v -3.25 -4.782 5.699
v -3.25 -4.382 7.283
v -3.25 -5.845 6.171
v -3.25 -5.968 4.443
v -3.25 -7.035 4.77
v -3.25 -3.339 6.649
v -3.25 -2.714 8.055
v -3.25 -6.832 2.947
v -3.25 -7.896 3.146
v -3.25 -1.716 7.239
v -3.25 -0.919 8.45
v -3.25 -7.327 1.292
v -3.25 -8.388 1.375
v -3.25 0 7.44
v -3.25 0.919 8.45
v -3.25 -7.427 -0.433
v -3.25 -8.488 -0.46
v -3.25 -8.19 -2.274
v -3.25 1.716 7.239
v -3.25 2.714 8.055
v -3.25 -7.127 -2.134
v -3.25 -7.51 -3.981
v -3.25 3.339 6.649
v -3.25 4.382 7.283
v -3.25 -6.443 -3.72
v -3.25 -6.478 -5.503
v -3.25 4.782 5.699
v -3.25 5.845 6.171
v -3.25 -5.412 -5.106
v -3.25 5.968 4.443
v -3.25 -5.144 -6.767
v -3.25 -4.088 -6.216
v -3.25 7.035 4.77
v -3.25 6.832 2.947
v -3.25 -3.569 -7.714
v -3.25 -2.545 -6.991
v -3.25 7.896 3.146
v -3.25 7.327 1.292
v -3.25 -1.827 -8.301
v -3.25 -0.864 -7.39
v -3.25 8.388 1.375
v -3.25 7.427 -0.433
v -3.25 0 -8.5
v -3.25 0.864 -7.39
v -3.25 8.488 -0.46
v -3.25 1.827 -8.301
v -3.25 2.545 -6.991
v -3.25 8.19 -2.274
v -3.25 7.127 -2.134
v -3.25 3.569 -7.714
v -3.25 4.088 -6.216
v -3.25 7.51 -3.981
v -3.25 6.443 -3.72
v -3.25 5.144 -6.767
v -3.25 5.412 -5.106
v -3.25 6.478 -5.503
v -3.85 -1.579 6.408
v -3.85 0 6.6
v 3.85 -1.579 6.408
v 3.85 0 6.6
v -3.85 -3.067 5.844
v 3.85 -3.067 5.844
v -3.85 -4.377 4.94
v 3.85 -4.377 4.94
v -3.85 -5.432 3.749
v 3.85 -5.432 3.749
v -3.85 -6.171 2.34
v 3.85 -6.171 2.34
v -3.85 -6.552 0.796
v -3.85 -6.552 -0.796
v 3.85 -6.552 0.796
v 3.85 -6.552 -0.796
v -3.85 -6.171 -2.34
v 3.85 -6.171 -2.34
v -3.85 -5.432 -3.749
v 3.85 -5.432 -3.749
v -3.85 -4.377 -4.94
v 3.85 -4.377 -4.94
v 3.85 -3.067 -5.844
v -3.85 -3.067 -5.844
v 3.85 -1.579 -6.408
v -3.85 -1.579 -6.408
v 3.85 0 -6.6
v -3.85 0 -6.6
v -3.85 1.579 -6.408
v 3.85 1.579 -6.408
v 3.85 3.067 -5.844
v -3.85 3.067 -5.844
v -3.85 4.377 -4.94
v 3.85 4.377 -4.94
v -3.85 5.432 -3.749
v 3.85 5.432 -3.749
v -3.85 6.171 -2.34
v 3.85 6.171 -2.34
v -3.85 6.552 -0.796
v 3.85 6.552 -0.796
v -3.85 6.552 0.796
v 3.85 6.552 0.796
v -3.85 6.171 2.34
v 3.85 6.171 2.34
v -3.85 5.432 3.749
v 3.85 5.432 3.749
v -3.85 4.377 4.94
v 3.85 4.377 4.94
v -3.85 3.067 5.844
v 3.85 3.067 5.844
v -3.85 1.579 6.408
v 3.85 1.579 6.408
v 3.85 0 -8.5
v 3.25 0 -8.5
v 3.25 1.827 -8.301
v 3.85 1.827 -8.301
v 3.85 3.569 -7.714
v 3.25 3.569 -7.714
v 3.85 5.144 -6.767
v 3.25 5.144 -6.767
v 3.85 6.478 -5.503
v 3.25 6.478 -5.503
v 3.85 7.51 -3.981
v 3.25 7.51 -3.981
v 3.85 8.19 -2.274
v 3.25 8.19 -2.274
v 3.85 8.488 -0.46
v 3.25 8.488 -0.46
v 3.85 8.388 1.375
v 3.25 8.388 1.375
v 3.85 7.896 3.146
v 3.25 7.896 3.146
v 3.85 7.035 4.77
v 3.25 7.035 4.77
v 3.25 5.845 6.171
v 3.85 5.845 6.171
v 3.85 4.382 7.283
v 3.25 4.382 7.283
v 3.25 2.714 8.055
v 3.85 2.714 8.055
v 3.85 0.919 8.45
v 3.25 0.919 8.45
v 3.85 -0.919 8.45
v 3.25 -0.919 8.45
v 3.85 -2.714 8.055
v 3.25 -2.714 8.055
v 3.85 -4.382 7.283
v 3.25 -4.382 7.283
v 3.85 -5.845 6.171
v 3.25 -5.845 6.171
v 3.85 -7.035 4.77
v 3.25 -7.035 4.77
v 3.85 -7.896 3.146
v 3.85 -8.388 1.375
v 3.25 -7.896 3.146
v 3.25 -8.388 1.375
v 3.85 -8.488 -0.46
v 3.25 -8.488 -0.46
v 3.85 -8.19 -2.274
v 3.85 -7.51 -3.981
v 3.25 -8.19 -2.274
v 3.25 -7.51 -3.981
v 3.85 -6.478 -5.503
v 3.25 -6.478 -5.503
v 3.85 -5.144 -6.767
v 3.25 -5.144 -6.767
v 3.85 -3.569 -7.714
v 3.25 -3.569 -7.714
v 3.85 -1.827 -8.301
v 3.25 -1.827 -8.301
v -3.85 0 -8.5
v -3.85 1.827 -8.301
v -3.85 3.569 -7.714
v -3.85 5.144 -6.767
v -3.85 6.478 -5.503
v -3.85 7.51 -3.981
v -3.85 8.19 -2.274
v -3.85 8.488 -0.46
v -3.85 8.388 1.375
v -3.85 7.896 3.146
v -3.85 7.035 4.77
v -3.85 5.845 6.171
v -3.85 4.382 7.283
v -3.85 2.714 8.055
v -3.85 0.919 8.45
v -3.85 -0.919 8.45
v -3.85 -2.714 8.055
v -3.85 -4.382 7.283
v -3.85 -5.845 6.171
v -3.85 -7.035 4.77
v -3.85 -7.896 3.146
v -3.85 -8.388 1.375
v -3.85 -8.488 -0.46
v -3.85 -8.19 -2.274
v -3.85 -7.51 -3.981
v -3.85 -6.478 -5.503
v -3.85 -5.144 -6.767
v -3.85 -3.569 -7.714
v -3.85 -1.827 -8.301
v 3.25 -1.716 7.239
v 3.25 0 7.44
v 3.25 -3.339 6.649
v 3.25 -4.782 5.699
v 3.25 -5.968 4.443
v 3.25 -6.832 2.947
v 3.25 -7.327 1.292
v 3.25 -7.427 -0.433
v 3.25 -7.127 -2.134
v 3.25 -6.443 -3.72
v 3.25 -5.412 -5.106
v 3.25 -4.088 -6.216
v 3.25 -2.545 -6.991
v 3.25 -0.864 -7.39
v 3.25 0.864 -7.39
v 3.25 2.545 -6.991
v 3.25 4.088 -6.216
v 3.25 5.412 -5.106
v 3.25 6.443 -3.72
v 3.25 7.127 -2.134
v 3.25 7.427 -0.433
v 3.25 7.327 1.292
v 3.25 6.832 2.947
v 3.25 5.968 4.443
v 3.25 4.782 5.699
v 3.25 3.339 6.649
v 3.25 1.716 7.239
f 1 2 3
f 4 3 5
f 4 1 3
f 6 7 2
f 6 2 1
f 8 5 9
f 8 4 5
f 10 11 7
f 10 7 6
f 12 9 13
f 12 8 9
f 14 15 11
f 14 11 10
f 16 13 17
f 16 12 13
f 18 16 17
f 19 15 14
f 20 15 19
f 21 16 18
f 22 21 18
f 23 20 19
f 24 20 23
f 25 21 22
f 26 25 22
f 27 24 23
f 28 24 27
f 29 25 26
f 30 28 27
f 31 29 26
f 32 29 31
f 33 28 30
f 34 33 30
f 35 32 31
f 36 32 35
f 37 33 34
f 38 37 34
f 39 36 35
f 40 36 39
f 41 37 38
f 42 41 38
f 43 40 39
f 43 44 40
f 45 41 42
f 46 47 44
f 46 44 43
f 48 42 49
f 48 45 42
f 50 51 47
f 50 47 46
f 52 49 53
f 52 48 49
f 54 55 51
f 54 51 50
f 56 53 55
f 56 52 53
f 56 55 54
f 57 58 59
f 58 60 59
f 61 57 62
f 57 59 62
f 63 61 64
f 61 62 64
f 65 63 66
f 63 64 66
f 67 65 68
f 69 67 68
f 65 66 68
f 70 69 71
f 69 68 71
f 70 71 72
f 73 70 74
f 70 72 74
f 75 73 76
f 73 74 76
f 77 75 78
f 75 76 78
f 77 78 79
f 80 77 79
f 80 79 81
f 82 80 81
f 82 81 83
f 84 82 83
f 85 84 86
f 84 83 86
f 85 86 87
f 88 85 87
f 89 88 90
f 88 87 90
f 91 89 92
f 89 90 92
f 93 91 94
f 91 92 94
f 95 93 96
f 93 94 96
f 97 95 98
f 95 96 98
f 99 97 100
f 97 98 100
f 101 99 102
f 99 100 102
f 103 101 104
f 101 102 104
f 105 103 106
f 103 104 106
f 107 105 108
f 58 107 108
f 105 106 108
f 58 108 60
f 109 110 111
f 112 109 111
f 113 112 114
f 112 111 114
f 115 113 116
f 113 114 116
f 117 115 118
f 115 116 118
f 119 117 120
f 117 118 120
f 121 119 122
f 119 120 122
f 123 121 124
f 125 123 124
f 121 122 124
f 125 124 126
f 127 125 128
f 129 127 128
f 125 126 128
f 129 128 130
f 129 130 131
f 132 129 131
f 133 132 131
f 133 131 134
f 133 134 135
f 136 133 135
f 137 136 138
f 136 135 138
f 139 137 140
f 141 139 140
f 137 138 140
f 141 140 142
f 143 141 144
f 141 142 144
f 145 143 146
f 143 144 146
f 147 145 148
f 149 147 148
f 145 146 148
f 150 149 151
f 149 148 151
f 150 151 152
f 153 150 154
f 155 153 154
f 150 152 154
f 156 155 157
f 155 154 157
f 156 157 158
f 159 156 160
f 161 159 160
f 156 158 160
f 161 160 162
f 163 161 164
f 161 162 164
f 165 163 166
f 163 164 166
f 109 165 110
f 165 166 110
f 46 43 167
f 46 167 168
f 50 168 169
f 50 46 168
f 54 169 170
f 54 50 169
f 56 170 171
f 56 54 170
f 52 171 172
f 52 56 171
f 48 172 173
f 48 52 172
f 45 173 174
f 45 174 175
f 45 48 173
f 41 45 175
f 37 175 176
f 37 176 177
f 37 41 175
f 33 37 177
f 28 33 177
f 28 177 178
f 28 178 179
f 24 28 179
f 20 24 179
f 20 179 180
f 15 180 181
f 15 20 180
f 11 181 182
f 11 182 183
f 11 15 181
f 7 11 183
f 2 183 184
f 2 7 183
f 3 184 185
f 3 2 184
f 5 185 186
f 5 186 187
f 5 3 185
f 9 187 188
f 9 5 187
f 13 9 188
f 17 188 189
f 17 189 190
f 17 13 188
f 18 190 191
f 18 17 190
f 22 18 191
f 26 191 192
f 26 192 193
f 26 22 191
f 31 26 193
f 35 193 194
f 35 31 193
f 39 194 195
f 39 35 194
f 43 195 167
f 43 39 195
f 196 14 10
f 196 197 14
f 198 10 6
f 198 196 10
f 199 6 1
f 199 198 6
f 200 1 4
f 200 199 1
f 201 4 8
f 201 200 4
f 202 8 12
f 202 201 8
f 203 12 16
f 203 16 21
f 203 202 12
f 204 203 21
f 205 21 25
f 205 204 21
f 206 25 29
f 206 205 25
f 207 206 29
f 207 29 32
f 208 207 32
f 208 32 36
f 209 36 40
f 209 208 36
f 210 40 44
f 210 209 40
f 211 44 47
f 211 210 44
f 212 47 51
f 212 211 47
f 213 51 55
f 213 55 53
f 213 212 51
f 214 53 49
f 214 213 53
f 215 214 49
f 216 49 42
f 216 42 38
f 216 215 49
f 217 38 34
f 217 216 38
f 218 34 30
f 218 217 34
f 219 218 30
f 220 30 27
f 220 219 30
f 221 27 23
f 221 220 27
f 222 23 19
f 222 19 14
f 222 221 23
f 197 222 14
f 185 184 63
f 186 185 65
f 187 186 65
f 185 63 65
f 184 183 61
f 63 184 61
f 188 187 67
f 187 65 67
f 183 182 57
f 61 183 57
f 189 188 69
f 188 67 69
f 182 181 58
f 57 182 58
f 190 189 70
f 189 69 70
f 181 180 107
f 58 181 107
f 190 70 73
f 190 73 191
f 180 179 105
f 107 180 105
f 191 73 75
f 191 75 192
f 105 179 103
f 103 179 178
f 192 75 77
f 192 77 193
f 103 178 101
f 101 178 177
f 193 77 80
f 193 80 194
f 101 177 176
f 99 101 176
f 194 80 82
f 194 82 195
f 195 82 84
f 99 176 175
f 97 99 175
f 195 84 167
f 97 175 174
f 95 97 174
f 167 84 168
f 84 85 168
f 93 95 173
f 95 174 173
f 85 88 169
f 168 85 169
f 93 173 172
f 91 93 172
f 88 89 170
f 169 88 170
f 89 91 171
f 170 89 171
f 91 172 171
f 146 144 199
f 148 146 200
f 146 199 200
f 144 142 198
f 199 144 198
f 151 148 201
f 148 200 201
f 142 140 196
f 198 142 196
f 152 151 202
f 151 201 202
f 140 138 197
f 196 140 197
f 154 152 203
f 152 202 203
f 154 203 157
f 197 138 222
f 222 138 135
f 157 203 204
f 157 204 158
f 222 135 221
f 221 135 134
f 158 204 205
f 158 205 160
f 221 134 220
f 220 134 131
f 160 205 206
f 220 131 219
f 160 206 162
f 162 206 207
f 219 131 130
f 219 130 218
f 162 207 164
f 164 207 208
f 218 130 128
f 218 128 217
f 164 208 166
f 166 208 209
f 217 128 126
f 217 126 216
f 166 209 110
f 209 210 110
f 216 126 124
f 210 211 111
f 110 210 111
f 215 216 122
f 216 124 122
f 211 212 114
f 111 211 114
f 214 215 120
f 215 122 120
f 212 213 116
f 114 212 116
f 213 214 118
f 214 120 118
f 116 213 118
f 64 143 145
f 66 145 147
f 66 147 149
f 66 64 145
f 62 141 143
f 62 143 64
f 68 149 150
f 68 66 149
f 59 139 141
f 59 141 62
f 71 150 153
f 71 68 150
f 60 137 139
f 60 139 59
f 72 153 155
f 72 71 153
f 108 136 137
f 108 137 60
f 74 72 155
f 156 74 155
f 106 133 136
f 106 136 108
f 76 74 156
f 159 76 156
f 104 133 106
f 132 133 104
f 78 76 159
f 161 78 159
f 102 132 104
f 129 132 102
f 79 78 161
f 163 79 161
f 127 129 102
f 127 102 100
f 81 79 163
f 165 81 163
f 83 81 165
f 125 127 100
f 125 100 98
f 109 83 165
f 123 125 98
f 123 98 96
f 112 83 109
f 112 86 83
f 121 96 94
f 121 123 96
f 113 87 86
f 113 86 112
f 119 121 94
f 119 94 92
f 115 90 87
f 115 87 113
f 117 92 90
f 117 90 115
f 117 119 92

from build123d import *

# Parameters (mm, degrees)
ESBO_O1_R                = 7.44
ESBO_O1_R_2              = 6.6
RESSALTO_EXTRUS_O1_DEPTH = 3.25
ESBO_O2_R                = 8.5
RESSALTO_EXTRUS_O2_DEPTH = 0.6
ESBO_O3_R                = 6.6
CORTE_EXTRUS_O1_DEPTH    = 15.275503494


with BuildPart() as part:
    # Esboço1 → Ressalto-extrusão1 (new, symmetric)
    with BuildSketch(Plane(origin=(0, 0, 0), x_dir=(0, 0, -1), z_dir=(1, 0, 0))):
        with Locations(Location((0, 0, 0), (0, 0, 180))):
            Circle(ESBO_O1_R)
        with Locations(Location((0, 0, 0), (0, 0, 180))):
            Circle(ESBO_O1_R_2, mode=Mode.SUBTRACT)
    extrude(amount=RESSALTO_EXTRUS_O1_DEPTH, both=True)

    # Esboço2 → Ressalto-extrusão2 (add)
    with BuildSketch(Plane(origin=(3.25, 0, 0), x_dir=(0, 0, -1), z_dir=(1, 0, 0))):
        Circle(ESBO_O2_R)
    ressalto_extrus_o2 = extrude(amount=RESSALTO_EXTRUS_O2_DEPTH)

    # Espelhar1: Ressalto-extrusão2 across plane
    add(ressalto_extrus_o2.mirror(Plane(origin=(0, 0, 0), x_dir=(0, 0, 1), z_dir=(1, 0, 0))))

    # Esboço3 → Corte-extrusão1 (cut, through all)
    with BuildSketch(Plane(origin=(3.85, 0, 0), x_dir=(0, 0, -1), z_dir=(1, 0, 0))):
        with Locations(Location((0, 0, 0), (0, 0, 180))):
            Circle(ESBO_O3_R)
    extrude(amount=-CORTE_EXTRUS_O1_DEPTH, mode=Mode.SUBTRACT)


solid = part.part
